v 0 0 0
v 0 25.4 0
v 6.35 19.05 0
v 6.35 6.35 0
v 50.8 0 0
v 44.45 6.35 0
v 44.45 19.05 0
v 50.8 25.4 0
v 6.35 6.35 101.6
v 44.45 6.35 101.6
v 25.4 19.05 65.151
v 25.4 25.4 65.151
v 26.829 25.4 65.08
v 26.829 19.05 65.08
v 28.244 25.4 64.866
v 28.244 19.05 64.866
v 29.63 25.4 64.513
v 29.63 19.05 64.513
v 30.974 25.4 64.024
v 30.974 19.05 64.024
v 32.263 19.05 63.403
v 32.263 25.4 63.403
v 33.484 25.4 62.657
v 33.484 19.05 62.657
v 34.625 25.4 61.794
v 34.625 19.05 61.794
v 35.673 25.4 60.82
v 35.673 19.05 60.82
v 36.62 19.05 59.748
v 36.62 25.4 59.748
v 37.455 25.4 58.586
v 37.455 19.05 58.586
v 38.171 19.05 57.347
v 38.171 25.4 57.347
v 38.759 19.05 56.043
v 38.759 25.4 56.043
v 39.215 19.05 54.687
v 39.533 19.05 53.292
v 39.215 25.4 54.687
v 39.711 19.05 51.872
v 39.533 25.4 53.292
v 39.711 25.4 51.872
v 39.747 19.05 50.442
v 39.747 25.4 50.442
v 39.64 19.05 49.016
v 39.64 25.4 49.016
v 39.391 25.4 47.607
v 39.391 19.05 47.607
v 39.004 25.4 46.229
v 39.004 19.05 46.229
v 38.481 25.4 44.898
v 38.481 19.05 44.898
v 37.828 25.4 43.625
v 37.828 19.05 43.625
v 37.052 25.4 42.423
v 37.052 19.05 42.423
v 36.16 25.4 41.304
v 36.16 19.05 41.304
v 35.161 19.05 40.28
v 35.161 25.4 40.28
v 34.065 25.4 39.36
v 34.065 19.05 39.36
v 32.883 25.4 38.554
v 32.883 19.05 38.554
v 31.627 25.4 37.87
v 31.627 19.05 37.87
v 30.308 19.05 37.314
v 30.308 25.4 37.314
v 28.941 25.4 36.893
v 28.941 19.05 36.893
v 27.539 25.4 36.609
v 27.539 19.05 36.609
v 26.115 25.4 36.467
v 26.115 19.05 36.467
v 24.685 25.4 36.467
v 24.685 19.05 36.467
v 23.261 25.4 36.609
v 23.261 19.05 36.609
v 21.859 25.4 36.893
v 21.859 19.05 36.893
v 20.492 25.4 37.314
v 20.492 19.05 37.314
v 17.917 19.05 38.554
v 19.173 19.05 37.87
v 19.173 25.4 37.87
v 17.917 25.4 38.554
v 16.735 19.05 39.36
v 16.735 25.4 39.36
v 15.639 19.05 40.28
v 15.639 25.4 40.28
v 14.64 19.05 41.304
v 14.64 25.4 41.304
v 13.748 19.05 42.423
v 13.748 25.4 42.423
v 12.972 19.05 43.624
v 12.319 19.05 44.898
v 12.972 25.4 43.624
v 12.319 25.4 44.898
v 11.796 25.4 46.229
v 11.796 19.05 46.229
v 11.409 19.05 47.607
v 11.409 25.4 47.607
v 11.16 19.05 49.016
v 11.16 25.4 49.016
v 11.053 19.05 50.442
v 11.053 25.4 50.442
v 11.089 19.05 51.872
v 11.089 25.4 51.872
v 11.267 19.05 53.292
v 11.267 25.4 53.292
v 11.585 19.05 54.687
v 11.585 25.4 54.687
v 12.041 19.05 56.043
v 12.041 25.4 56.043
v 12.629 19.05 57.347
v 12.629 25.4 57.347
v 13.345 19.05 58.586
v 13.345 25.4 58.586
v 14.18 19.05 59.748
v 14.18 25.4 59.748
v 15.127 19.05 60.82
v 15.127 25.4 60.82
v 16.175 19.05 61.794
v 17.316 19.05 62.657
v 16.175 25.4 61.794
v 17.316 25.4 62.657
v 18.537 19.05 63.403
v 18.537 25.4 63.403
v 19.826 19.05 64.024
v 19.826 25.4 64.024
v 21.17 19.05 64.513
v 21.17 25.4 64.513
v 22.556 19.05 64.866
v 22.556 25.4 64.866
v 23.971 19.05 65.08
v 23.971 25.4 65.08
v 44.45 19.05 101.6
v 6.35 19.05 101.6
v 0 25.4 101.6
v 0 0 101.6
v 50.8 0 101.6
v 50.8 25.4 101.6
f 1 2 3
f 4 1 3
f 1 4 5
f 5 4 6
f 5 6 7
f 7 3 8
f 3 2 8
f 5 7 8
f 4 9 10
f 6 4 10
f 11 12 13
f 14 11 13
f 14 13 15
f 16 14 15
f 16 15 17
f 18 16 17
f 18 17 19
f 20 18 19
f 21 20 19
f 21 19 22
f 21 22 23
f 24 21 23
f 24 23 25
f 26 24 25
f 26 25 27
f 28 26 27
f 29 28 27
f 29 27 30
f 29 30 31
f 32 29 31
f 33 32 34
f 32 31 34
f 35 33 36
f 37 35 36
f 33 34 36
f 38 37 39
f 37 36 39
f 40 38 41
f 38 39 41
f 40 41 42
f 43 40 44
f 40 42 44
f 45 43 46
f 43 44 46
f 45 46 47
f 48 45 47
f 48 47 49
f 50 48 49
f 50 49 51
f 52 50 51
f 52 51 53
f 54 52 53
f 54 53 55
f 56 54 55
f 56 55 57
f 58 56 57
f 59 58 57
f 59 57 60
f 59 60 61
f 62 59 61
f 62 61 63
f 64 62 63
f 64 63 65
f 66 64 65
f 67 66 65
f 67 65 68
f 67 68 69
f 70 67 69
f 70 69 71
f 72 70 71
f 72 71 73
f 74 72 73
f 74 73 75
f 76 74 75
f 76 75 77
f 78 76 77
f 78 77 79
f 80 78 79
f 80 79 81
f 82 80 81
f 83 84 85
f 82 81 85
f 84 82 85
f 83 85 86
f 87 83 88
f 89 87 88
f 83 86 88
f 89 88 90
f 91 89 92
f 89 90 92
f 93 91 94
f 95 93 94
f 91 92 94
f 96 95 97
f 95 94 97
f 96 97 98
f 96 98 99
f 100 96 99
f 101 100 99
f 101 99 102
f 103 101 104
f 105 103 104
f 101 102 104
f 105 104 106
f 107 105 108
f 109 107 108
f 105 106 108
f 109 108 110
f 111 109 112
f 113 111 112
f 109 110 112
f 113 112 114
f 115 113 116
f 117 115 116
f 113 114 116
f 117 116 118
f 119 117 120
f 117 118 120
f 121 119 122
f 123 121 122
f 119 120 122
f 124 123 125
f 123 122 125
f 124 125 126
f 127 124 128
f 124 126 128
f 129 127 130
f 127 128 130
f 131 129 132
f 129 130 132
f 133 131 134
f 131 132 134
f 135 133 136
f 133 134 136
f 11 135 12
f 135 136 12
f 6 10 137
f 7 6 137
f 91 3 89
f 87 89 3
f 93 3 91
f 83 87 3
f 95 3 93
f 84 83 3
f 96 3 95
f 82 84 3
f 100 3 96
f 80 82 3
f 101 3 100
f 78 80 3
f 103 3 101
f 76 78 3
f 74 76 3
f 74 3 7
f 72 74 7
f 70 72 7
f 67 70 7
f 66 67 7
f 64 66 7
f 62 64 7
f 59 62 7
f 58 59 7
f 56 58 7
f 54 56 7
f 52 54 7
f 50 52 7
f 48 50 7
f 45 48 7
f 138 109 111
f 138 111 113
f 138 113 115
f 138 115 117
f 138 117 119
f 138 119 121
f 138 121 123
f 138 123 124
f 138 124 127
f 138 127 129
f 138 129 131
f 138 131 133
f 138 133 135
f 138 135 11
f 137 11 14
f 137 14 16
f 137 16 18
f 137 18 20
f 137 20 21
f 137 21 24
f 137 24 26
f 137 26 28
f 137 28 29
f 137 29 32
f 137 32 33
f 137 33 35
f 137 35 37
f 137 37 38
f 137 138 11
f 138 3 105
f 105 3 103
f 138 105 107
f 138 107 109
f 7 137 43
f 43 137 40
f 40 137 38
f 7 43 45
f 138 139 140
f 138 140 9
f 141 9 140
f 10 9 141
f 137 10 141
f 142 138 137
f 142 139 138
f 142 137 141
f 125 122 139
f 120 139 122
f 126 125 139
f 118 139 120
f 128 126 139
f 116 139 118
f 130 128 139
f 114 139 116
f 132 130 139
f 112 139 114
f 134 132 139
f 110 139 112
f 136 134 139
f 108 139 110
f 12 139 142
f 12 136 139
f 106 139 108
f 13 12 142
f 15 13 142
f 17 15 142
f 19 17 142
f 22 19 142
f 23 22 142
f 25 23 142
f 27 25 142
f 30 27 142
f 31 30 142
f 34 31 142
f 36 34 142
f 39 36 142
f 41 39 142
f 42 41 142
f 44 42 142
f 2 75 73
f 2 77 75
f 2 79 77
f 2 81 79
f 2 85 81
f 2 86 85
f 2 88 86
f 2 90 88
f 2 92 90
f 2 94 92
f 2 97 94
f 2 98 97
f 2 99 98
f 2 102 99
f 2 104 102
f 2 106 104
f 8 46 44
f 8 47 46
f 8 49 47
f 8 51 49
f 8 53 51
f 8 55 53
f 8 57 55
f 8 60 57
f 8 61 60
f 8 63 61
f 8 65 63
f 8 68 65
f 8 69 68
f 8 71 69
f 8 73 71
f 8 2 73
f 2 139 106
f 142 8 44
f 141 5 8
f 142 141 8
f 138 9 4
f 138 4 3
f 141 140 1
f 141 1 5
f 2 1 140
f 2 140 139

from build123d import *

# Parameters (mm, degrees)
SKETCH1_W           = 50.8
SKETCH1_H           = 25.4
BOSS_EXTRUDE1_DEPTH = 101.6
SKETCH2_W           = 38.1
SKETCH2_H           = 12.7
CUT_EXTRUDE1_DEPTH  = 117.397422652
CUT_EXTRUDE3_REACH  = 118.397
SKETCH5_R           = 14.351


with BuildPart() as part:
    # Sketch1 → Boss-Extrude1 (new body)
    with BuildSketch(Plane.XY):
        with Locations((25.4, 12.7)):
            Rectangle(SKETCH1_W, SKETCH1_H)
    extrude(amount=BOSS_EXTRUDE1_DEPTH)

    # Sketch2 → Cut-Extrude1 (cut, through all)
    with BuildSketch(Plane.XY.offset(101.6)):
        with Locations((25.4, 12.7)):
            Rectangle(SKETCH2_W, SKETCH2_H)
    extrude(amount=-CUT_EXTRUDE1_DEPTH, mode=Mode.SUBTRACT)

    # Sketch5 → Cut-Extrude3 (cut, up to next)
    with BuildSketch(Plane(origin=(0, 25.4, 0), x_dir=(1, 0, 0), z_dir=(0, 1, 0)), mode=Mode.PRIVATE) as cut_extrude3_sk1:
        with Locations(Location((25.4, -50.8, 0), (0, 0, 270))):
            Circle(SKETCH5_R)
    cut_extrude3_tool1 = extrude(cut_extrude3_sk1.sketch, amount=-CUT_EXTRUDE3_REACH, mode=Mode.PRIVATE) & part.part
    add(cut_extrude3_tool1.solids().sort_by_distance((25.4, 25.4, 50.8))[0], mode=Mode.SUBTRACT)


solid = part.part
